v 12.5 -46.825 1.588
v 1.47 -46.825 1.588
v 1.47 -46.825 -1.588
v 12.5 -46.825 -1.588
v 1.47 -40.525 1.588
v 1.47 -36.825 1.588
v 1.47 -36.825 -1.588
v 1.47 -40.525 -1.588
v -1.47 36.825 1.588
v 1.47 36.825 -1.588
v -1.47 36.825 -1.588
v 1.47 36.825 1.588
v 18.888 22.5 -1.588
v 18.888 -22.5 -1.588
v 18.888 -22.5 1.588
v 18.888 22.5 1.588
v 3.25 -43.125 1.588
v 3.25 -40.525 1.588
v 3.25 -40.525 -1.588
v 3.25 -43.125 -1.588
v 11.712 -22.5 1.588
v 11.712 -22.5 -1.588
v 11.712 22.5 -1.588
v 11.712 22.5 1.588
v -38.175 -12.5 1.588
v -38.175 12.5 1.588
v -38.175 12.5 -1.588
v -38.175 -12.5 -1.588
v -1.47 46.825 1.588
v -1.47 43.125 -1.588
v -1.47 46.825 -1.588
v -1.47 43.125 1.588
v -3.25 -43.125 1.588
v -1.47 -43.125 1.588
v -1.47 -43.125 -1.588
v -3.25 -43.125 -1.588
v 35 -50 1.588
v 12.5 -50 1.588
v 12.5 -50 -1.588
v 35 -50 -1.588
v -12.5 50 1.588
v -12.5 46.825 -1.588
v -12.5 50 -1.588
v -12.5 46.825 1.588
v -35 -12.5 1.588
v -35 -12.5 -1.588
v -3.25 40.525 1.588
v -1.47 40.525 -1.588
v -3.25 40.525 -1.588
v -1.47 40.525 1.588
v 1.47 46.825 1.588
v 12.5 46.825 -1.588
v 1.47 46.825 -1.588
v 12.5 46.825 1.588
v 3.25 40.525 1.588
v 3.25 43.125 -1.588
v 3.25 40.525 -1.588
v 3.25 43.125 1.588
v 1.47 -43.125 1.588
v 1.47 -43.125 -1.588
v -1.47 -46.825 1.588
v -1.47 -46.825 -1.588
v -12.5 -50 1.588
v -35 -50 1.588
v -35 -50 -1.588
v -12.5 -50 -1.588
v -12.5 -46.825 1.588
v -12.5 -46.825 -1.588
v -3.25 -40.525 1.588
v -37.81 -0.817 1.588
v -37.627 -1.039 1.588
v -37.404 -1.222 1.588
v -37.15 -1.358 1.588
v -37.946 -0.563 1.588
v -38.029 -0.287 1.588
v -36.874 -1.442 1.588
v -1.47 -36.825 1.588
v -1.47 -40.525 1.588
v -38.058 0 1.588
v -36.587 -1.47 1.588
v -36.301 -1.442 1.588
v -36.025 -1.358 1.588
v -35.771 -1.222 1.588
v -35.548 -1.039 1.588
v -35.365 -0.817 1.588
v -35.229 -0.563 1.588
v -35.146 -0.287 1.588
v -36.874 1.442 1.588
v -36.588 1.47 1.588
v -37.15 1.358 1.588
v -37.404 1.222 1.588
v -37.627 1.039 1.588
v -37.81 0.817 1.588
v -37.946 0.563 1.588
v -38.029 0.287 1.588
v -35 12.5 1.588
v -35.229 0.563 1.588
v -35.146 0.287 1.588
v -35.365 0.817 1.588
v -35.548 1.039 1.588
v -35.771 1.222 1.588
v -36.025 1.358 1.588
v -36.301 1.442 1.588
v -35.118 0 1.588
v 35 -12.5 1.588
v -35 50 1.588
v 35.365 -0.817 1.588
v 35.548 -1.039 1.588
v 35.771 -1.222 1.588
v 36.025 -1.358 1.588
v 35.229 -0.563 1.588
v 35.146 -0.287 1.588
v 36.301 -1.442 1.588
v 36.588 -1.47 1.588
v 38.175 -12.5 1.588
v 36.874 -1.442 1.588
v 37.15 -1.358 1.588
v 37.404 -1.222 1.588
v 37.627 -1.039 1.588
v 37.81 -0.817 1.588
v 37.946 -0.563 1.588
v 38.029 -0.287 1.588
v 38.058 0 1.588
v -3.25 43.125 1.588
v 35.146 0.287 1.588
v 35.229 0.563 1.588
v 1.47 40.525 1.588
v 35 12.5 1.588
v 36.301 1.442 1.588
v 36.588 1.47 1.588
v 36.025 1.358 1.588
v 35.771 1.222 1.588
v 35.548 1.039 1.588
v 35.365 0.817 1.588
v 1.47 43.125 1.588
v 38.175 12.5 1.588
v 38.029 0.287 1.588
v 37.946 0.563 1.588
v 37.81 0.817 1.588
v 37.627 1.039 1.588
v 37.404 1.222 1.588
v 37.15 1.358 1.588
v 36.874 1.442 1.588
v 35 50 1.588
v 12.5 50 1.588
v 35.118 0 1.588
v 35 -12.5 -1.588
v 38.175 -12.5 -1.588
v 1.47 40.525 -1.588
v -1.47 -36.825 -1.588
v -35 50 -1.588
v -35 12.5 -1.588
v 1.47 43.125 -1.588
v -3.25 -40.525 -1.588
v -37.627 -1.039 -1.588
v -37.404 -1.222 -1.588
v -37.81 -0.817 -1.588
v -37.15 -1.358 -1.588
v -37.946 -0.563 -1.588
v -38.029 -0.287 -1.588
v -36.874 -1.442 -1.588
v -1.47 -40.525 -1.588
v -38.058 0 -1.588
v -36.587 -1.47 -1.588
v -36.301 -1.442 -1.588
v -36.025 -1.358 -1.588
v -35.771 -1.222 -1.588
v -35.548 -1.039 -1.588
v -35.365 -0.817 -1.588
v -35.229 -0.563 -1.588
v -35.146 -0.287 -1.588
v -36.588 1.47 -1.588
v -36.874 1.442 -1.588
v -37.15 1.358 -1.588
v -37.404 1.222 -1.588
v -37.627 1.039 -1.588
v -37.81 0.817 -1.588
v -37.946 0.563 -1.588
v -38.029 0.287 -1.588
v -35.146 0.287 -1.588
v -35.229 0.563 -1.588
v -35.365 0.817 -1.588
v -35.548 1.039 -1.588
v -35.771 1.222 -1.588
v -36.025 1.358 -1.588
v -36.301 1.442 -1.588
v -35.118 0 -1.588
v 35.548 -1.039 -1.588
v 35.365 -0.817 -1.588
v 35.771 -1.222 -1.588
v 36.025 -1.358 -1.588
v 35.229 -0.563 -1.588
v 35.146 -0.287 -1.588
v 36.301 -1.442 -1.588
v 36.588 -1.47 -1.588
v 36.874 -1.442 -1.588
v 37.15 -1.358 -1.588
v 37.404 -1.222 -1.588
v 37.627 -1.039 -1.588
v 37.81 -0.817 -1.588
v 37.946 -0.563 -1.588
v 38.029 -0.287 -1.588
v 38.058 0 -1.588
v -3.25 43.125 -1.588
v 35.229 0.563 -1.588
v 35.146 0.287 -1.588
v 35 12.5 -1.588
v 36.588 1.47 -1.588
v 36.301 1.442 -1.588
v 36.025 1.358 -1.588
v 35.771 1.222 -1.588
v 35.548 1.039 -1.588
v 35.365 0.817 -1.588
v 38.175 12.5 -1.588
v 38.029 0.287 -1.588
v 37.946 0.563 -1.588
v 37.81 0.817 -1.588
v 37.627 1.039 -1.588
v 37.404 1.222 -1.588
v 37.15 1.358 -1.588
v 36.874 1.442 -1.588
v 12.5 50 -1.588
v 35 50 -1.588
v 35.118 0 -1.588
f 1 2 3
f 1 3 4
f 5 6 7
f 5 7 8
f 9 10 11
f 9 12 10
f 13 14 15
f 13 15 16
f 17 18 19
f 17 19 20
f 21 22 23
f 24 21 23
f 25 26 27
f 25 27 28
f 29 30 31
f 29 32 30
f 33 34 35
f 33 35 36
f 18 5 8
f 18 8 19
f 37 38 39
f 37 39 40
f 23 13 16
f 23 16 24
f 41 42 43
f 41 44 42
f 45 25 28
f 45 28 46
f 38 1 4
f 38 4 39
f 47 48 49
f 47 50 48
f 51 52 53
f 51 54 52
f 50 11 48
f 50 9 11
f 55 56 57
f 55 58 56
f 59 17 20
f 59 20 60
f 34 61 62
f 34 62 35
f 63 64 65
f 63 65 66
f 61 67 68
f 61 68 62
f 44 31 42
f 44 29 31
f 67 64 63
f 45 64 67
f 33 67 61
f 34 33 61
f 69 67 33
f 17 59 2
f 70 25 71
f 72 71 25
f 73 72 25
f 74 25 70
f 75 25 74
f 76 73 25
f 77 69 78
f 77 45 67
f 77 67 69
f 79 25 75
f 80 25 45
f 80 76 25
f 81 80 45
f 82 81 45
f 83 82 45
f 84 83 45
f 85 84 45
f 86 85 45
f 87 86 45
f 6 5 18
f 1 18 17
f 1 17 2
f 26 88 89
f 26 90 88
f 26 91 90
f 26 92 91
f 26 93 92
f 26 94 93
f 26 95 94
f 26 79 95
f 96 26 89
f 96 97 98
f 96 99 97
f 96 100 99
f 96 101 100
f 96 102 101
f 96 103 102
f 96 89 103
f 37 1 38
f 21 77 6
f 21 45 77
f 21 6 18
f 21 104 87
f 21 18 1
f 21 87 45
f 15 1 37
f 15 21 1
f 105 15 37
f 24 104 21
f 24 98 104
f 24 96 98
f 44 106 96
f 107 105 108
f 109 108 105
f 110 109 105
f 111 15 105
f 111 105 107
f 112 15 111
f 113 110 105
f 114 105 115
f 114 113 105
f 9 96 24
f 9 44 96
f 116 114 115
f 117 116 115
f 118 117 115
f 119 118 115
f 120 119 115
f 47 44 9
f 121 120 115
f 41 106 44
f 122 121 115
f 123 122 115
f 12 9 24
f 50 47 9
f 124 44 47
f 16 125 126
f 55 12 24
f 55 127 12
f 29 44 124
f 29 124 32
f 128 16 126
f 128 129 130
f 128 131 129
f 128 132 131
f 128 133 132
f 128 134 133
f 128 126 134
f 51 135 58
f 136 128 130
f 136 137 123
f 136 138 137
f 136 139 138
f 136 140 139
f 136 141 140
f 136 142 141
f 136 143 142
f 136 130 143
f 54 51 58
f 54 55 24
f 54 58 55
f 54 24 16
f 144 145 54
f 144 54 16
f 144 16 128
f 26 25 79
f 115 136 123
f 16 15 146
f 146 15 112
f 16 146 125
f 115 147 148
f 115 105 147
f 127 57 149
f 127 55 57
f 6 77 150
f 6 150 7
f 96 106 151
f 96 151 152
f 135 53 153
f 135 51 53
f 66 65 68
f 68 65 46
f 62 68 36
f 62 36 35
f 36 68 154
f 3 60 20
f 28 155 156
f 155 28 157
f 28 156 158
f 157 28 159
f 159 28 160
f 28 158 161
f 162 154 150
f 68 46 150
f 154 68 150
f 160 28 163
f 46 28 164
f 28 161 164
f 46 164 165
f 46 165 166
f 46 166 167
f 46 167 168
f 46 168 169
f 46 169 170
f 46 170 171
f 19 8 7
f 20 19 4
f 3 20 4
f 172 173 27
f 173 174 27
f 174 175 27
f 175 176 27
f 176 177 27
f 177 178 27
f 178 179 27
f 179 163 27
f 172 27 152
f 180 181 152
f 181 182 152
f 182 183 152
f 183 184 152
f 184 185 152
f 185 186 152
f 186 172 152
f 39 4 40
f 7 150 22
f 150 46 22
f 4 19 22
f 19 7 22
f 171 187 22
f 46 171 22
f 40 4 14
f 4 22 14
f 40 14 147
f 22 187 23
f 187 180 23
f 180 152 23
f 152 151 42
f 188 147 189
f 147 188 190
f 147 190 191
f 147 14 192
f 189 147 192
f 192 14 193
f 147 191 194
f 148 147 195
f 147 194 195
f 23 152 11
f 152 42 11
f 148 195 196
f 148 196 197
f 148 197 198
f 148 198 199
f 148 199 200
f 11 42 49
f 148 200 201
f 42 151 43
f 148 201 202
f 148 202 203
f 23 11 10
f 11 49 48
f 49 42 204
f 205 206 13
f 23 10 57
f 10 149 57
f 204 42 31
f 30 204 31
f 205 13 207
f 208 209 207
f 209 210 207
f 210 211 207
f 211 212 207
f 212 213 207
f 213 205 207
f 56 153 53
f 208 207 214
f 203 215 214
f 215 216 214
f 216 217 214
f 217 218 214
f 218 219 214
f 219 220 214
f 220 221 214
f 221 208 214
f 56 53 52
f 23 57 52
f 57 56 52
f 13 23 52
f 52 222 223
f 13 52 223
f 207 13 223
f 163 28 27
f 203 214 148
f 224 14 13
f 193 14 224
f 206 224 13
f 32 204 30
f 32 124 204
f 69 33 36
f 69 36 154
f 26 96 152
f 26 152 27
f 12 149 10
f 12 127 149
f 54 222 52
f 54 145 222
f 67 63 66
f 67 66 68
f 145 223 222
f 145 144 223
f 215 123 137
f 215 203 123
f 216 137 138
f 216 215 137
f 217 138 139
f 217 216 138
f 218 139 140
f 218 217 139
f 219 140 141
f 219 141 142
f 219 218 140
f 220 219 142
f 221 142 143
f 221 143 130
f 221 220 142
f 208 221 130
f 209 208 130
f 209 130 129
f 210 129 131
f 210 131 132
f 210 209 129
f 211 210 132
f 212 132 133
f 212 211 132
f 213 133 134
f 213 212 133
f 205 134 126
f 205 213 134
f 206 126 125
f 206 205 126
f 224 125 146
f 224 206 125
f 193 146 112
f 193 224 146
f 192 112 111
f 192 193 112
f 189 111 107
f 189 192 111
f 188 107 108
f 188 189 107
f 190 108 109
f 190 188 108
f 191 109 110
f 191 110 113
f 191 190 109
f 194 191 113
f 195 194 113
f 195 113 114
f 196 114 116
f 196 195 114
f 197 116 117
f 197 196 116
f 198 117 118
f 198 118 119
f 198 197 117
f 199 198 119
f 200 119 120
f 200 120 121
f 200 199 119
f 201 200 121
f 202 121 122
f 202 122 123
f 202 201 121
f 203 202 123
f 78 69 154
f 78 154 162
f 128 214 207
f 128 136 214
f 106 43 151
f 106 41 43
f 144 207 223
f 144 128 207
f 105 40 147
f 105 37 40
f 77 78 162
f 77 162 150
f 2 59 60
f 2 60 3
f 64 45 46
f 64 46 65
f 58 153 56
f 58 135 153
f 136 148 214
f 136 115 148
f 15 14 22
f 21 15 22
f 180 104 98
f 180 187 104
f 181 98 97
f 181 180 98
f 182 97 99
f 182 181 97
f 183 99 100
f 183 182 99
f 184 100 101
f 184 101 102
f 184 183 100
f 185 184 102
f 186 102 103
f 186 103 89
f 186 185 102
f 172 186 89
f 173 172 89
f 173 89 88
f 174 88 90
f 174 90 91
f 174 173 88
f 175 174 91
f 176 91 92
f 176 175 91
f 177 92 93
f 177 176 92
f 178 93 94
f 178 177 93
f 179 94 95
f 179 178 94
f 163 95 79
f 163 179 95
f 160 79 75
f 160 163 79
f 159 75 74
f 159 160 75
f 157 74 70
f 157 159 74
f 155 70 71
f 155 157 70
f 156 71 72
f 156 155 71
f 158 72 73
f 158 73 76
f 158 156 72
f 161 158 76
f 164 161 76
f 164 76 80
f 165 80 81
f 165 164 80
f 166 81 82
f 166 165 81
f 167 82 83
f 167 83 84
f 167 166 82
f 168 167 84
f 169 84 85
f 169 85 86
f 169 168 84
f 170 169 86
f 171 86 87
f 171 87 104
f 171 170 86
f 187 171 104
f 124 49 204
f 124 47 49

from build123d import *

# Parameters (mm, degrees)
SKETCH1_R           = 1.47
BOSS_EXTRUDE1_DEPTH = 1.5875
SKETCH3_W           = 7.175
SKETCH3_H           = 45
CUT_EXTRUDE1_DEPTH  = 4.175


with BuildPart() as part:
    # Sketch1 → Boss-Extrude1 (new body, symmetric)
    with BuildSketch(Plane.XY):
        Polygon((-12.5, 50), (-35, 50), (-35, 12.5), (-38.175, 12.5), (-38.175, -12.5), (-35, -12.5), (-35, -50), (-12.5, -50), (-12.5, -46.825), (-1.47, -46.825), (-1.47, -43.125), (-3.25, -43.125), (-3.25, -40.525), (-1.47, -40.525), (-1.47, -36.825), (1.47, -36.825), (1.47, -40.525), (3.25, -40.525), (3.25, -43.125), (1.47, -43.125), (1.47, -46.825), (12.5, -46.825), (12.5, -50), (35, -50), (35, -12.5), (38.175, -12.5), (38.175, 12.5), (35, 12.5), (35, 50), (12.5, 50), (12.5, 46.825), (1.47, 46.825), (1.47, 43.125), (3.25, 43.125), (3.25, 40.525), (1.47, 40.525), (1.47, 36.825), (-1.47, 36.825), (-1.47, 40.525), (-3.25, 40.525), (-3.25, 43.125), (-1.47, 43.125), (-1.47, 46.825), (-12.5, 46.825), align=None)
        with Locations((-36.5875, 0)):
            Circle(SKETCH1_R, mode=Mode.SUBTRACT)
        with Locations((36.5875, 0)):
            Circle(SKETCH1_R, mode=Mode.SUBTRACT)
    extrude(amount=BOSS_EXTRUDE1_DEPTH, both=True)

    # Sketch3 → Cut-Extrude1 (cut, through all)
    with BuildSketch(Plane(origin=(0, 0, -1.5875), x_dir=(-1, 0, 0), z_dir=(0, 0, -1))):
        with Locations((-15.3, 0)):
            Rectangle(SKETCH3_W, SKETCH3_H)
    extrude(amount=-CUT_EXTRUDE1_DEPTH, mode=Mode.SUBTRACT)


solid = part.part
